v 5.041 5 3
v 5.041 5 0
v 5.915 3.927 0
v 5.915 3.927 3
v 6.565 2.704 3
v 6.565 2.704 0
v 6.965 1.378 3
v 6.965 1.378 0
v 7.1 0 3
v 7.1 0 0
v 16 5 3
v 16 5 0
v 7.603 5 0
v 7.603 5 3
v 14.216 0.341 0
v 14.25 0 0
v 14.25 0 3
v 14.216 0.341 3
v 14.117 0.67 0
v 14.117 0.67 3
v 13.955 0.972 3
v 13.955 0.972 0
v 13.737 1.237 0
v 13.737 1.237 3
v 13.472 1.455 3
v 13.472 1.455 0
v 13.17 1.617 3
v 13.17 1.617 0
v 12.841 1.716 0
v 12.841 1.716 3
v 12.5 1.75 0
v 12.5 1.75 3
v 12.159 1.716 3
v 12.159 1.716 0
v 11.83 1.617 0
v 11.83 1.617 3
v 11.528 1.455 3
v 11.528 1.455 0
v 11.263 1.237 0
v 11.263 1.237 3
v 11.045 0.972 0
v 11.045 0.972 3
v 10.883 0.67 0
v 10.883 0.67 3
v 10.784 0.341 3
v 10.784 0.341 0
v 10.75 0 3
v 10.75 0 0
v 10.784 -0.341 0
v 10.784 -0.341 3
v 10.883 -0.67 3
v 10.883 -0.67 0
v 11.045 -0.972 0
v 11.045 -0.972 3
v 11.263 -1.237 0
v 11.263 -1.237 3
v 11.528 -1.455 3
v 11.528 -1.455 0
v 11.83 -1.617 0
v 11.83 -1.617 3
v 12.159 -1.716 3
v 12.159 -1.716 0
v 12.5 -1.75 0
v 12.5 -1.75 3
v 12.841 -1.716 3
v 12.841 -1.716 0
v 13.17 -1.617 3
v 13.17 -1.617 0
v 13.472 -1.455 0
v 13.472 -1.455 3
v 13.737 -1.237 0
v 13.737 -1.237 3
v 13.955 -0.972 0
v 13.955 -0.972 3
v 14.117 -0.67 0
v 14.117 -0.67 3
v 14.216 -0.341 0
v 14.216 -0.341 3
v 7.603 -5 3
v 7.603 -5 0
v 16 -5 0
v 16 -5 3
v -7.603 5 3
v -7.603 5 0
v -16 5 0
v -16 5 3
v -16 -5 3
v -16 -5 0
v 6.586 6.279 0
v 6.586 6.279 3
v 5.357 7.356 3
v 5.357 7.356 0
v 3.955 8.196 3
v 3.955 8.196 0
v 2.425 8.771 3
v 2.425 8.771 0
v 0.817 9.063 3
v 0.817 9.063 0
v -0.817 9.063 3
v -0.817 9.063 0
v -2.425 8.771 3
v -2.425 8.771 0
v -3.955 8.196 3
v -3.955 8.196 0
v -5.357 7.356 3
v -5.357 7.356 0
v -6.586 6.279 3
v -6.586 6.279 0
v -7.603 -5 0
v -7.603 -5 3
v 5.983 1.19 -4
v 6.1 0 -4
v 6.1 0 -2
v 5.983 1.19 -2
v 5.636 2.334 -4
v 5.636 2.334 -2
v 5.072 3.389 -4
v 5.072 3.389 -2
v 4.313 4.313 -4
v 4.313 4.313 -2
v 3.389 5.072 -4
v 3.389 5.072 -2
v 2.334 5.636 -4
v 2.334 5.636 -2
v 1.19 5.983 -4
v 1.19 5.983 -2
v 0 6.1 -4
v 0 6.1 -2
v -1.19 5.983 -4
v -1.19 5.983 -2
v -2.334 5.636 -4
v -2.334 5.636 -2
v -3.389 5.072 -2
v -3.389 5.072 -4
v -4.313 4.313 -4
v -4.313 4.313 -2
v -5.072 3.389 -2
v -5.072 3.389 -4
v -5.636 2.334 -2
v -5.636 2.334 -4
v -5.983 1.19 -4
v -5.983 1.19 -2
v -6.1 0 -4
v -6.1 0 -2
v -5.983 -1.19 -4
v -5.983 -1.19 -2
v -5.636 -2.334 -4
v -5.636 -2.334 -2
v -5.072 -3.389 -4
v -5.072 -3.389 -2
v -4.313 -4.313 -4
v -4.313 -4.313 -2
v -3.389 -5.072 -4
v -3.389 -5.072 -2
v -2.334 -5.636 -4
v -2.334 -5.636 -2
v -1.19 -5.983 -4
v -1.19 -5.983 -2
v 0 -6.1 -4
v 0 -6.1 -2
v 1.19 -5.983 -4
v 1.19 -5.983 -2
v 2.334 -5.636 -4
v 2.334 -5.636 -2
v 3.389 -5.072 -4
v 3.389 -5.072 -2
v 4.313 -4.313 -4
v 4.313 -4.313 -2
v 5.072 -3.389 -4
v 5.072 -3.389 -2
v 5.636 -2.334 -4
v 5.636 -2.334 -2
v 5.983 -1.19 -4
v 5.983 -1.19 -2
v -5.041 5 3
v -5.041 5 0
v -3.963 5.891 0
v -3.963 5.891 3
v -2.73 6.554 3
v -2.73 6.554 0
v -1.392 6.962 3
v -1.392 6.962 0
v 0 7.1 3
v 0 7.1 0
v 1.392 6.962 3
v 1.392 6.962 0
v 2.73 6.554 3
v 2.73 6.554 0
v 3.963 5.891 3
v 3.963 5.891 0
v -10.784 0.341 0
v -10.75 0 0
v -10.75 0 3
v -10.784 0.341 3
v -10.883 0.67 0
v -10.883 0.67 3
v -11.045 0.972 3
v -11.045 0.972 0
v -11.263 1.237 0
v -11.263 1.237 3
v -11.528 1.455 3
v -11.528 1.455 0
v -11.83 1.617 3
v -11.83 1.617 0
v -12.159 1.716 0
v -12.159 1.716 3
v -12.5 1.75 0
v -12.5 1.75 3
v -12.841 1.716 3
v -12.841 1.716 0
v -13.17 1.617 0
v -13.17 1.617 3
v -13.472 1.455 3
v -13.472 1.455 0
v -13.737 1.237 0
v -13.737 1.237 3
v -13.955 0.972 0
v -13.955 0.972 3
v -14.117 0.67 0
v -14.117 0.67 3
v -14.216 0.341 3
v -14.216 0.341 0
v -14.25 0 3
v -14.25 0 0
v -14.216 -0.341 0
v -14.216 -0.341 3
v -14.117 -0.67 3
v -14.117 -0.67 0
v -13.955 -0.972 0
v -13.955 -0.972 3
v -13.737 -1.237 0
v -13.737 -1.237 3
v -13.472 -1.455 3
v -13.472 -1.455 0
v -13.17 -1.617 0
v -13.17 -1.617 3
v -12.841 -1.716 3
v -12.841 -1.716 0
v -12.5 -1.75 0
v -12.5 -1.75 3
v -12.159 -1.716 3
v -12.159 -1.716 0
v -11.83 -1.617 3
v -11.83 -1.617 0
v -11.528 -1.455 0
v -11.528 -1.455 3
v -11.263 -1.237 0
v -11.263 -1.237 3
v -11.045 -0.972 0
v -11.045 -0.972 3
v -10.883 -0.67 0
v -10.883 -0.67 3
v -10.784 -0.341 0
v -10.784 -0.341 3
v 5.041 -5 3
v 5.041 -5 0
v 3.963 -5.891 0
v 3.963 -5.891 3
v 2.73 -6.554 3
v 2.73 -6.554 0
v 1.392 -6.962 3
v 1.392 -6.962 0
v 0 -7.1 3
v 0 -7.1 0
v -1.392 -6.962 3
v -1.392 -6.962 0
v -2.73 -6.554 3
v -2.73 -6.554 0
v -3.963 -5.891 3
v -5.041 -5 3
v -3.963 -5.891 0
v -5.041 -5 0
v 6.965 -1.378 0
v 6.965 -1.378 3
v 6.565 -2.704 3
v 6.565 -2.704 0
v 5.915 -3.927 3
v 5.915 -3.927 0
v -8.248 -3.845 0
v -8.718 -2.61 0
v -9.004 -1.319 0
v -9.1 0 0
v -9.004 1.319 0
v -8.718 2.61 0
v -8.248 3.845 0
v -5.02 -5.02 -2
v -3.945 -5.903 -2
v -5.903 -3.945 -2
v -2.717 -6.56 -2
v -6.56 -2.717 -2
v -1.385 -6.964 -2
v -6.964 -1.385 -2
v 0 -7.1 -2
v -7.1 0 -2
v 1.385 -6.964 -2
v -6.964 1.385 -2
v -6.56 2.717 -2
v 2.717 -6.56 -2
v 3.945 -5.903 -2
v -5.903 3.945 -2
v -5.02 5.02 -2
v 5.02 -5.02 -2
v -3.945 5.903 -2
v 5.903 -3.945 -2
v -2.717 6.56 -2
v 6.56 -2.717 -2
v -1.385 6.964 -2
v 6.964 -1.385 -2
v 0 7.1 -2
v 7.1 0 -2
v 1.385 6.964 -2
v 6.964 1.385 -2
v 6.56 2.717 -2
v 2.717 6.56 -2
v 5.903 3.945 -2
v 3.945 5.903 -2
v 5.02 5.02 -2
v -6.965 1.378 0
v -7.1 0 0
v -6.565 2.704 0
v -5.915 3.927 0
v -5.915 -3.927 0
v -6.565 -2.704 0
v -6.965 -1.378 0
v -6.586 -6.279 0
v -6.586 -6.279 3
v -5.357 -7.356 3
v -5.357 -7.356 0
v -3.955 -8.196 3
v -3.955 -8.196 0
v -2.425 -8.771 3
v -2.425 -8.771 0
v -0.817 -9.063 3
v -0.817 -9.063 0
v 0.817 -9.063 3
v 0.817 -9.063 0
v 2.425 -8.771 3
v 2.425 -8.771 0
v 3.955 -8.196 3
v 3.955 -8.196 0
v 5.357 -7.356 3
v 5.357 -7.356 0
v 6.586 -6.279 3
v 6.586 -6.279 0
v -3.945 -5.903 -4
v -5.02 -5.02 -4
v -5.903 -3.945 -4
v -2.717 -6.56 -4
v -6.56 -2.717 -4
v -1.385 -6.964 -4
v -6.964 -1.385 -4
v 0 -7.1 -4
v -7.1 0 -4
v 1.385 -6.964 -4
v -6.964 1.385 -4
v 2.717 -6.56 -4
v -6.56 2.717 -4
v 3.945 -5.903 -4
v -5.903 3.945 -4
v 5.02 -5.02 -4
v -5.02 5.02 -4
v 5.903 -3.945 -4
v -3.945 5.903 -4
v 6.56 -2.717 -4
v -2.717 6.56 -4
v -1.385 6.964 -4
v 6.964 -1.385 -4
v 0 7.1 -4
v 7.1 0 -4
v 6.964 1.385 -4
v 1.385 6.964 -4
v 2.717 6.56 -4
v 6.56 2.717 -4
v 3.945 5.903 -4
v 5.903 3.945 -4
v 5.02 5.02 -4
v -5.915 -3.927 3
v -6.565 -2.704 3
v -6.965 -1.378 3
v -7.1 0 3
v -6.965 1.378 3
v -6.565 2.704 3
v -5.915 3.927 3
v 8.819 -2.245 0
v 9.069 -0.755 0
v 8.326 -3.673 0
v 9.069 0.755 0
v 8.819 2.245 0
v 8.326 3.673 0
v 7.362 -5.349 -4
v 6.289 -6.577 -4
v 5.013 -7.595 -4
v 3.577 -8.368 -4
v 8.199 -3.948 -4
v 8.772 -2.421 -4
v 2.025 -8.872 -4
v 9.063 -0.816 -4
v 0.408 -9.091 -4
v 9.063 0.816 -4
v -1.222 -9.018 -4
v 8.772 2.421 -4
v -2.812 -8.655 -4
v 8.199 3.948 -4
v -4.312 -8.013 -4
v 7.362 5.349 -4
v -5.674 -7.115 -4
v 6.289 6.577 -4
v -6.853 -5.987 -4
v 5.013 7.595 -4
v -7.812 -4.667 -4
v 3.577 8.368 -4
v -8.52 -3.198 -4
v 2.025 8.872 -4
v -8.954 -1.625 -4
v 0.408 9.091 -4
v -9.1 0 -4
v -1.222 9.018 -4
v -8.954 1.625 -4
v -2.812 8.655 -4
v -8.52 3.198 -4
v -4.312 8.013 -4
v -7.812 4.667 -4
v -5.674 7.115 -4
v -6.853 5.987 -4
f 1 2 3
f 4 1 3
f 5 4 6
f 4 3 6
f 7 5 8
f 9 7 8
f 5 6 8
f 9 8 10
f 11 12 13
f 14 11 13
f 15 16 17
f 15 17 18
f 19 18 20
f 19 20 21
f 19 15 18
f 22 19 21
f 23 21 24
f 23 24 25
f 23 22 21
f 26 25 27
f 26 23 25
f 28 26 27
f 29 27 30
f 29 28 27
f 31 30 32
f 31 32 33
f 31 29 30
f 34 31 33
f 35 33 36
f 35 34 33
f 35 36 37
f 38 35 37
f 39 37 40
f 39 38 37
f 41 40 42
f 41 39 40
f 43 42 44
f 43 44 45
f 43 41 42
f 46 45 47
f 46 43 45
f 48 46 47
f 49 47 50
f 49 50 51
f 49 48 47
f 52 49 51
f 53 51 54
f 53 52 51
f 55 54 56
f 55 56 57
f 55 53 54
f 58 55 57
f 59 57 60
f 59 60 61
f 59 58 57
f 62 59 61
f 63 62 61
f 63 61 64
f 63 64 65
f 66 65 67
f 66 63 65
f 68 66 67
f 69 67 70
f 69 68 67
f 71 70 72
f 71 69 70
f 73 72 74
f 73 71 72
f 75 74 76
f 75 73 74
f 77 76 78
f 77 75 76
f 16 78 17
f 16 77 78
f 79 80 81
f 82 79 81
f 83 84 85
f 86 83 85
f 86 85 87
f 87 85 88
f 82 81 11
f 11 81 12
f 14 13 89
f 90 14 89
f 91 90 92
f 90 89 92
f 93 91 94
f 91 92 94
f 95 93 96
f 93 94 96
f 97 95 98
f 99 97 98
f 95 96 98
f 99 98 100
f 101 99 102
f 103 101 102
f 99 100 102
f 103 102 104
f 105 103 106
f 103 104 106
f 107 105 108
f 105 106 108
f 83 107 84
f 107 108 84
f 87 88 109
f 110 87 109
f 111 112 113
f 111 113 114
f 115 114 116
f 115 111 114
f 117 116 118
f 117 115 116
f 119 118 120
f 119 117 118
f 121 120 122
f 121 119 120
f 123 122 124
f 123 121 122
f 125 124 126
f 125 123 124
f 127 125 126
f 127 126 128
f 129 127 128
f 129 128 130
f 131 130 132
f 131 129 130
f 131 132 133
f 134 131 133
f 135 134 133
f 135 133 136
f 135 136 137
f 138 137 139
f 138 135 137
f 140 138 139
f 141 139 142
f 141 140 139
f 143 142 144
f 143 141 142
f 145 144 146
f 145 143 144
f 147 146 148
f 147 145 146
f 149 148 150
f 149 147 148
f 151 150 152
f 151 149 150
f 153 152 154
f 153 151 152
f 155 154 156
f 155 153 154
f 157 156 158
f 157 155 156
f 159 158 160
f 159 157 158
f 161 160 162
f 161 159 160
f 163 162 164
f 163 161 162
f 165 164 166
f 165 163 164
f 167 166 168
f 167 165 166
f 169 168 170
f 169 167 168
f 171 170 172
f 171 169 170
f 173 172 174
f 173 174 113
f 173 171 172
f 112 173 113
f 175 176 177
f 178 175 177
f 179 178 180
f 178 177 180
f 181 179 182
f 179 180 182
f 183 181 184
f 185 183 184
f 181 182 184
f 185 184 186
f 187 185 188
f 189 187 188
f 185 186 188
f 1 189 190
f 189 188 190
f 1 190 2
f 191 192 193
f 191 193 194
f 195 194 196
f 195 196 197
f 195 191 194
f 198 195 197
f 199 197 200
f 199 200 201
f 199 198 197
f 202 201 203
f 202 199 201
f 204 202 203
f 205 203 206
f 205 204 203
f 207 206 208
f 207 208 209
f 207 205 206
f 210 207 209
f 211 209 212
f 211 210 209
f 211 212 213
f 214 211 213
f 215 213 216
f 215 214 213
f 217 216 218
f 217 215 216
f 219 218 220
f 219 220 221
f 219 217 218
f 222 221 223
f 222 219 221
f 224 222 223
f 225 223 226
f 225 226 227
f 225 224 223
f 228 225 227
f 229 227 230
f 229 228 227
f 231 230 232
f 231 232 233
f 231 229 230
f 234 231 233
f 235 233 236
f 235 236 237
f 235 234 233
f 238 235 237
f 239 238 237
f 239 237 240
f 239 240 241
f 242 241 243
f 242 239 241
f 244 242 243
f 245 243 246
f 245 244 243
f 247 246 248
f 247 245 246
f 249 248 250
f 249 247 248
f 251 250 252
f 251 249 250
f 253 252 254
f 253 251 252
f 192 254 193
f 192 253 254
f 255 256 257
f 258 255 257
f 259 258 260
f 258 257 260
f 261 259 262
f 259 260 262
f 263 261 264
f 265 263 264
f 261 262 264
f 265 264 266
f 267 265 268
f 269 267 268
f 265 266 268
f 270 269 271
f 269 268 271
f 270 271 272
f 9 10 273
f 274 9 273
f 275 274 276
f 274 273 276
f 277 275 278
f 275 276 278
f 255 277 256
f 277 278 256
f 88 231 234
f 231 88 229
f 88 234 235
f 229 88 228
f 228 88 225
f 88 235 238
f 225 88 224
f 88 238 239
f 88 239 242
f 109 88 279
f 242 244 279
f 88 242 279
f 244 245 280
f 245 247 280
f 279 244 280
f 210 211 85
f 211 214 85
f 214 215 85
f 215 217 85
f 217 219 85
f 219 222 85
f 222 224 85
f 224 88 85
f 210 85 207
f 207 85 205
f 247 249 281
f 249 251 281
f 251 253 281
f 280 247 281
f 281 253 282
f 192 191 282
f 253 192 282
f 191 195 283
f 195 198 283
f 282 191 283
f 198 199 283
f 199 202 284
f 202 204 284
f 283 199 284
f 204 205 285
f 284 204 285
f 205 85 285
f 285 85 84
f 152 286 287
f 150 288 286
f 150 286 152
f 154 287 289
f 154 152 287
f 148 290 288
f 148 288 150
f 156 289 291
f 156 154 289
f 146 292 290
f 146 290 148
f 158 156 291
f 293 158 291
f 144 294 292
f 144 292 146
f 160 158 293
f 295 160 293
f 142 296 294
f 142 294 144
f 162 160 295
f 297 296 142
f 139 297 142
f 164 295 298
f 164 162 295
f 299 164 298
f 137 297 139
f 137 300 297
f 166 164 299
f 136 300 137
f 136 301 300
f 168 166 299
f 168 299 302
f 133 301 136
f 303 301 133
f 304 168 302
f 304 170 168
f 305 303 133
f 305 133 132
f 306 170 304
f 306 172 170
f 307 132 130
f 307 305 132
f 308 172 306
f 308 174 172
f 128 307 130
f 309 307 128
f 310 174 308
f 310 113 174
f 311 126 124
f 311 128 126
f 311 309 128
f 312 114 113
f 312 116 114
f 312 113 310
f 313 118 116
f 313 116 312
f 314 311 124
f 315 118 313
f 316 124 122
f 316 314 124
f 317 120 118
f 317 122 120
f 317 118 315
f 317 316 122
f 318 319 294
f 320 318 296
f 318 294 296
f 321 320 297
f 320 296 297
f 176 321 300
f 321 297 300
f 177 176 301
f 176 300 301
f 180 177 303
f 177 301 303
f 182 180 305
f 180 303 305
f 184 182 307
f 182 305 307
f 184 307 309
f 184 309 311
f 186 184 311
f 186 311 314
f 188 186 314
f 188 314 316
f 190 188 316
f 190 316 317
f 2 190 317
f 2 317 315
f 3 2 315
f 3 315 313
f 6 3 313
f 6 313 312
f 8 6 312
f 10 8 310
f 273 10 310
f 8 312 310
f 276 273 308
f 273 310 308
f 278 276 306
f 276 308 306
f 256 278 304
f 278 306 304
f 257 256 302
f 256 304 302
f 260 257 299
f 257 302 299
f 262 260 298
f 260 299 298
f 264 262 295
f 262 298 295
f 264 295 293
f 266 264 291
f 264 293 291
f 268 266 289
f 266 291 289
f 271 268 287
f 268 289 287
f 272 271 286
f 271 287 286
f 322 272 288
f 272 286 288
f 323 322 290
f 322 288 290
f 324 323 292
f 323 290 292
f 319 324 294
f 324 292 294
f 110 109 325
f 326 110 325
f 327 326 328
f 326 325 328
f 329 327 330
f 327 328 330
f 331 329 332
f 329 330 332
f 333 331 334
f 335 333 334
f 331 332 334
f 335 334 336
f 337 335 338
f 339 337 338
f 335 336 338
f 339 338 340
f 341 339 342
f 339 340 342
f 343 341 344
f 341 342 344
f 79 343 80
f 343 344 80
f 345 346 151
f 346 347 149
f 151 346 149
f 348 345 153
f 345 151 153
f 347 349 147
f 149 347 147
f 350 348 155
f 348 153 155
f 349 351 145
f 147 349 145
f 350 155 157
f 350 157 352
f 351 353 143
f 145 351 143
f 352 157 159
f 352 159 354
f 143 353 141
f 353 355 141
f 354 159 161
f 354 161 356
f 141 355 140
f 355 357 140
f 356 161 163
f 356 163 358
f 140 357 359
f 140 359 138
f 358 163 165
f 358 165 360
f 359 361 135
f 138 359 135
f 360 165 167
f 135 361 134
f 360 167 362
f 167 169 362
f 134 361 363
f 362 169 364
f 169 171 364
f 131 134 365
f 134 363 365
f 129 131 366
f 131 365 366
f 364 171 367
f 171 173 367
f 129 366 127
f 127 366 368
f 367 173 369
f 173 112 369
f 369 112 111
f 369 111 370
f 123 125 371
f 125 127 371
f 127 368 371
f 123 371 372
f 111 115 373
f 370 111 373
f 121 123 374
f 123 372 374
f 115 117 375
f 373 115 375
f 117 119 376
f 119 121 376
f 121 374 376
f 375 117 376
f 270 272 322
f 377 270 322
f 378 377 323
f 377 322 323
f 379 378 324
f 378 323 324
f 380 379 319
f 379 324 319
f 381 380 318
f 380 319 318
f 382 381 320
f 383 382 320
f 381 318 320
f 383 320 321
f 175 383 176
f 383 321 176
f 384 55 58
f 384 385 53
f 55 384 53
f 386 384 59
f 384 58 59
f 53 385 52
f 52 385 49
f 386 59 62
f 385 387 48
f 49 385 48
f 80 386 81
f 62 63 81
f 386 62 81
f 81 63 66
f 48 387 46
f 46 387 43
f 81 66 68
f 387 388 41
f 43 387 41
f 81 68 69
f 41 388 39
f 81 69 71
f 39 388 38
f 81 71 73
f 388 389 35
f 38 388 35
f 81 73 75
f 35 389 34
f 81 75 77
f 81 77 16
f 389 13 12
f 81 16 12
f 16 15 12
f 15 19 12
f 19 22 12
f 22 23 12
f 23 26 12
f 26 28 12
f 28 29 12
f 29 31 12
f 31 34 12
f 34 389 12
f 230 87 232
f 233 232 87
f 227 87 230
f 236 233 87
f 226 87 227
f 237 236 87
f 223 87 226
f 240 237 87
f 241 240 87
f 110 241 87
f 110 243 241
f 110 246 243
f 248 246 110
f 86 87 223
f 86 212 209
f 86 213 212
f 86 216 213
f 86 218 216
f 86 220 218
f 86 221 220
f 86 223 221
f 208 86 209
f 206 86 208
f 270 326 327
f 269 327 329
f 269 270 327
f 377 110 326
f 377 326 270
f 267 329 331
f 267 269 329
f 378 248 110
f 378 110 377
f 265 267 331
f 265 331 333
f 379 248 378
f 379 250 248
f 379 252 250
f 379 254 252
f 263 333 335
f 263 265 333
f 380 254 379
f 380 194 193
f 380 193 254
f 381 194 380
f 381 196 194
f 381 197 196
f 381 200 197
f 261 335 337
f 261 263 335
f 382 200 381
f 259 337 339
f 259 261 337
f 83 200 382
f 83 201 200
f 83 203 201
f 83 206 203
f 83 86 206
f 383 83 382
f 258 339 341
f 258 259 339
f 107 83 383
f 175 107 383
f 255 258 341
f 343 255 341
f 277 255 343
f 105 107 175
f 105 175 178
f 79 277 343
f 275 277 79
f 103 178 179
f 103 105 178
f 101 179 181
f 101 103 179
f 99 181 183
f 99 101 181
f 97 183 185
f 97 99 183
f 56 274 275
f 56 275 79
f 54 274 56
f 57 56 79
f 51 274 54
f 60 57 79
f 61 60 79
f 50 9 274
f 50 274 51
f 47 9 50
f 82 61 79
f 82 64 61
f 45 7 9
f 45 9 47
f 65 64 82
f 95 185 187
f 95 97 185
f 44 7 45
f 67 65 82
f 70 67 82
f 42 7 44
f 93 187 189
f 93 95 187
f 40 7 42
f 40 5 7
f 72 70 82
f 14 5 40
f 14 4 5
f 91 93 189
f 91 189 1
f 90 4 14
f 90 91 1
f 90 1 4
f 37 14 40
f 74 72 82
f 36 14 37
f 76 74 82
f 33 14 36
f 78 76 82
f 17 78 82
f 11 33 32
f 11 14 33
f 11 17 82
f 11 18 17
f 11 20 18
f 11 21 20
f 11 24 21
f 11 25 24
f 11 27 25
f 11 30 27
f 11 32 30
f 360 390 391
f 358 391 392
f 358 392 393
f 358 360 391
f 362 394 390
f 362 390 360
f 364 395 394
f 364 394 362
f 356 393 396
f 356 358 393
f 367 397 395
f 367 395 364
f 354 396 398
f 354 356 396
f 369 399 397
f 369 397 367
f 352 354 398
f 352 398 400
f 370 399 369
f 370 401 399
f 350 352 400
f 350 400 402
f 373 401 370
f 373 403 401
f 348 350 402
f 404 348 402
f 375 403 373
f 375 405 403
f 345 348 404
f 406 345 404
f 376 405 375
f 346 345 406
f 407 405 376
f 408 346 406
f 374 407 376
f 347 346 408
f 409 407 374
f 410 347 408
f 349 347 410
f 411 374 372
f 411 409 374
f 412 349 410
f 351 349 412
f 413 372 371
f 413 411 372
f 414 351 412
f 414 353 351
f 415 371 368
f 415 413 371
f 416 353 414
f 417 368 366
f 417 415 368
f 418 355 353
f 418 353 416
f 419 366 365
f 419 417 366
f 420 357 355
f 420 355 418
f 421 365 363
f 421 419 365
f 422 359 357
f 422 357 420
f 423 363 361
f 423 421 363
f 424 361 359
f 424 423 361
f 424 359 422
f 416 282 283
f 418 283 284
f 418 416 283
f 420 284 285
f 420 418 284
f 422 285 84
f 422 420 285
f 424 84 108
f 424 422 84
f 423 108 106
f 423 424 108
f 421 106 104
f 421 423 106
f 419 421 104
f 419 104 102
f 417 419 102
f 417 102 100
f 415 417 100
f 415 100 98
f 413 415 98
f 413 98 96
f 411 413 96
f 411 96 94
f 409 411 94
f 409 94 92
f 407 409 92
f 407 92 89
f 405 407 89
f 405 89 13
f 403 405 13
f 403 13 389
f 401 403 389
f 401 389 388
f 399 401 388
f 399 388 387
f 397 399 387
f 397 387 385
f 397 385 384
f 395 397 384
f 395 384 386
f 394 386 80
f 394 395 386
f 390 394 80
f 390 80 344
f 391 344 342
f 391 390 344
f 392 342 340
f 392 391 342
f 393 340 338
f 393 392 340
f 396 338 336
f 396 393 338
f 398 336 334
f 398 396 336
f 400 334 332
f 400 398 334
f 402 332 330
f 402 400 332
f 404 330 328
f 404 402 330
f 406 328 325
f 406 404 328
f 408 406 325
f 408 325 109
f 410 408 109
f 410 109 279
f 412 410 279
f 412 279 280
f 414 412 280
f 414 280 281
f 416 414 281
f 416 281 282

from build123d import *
from build123d.topology import SkipClean

# Parameters (mm, degrees)
SKETCH_1_R      = 1.75
EXTRUDE_1_DEPTH = 3
EXTRUDE_START   = 4
SKETCH_2_R      = 9.1
SKETCH_2_R_2    = 7.1
EXTRUDE_2_DEPTH = 4
SKETCH_3_R      = 7.1
SKETCH_3_R_2    = 6.1
EXTRUDE_3_DEPTH = 2


with BuildPart() as part:
    # Эскиз1 → Бобышка-Вытянуть1 (new body)
    # profile 1 of 8: a face of its own
    with BuildSketch(Plane.XY):
        with BuildLine():
            Line((-16, 5), (-16, -5))
            Line((-16, -5), (-7.603288762, -5))
            ThreePointArc((-7.603288762, -5), (-9.1, 0), (-7.603288762, 5))
            Line((-7.603288762, 5), (-16, 5))
        make_face()
        with Locations((-12.5, 0)):
            Circle(SKETCH_1_R, mode=Mode.SUBTRACT)
    # profile 2 of 8: a face of its own
    with BuildSketch(Plane.XY):
        with BuildLine():
            ThreePointArc((-7.603288762, 5), (-9.1, 0), (-7.603288762, -5))
            Line((-7.603288762, -5), (-5.040833264, -5))
            ThreePointArc((-5.040833264, -5), (-7.1, 0), (-5.040833264, 5))
            Line((-5.040833264, 5), (-7.603288762, 5))
        make_face()
    # profile 3 of 8: a face of its own
    with BuildSketch(Plane.XY):
        with BuildLine():
            Line((5.040833264, -5), (7.603288762, -5))
            ThreePointArc((7.603288762, -5), (8.717795815, -2.609604593), (9.1, 0))
            ThreePointArc((9.1, 0), (8.717795815, 2.609604593), (7.603288762, 5))
            Line((7.603288762, 5), (5.040833264, 5))
            ThreePointArc((5.040833264, 5), (6.565055833, 2.703708918), (7.1, 0))
            ThreePointArc((7.1, 0), (6.565055833, -2.703708918), (5.040833264, -5))
        make_face()
    # profile 4 of 8: a face of its own
    with BuildSketch(Plane.XY):
        with BuildLine():
            ThreePointArc((7.603288762, 5), (0, 9.1), (-7.603288762, 5))
            Line((-7.603288762, 5), (-5.040833264, 5))
            ThreePointArc((-5.040833264, 5), (0, 7.1), (5.040833264, 5))
            Line((5.040833264, 5), (7.603288762, 5))
        make_face()
    # profile 5 of 8: a face of its own
    with BuildSketch(Plane.XY):
        with BuildLine():
            ThreePointArc((-7.603288762, 5), (-9.1, 0), (-7.603288762, -5))
            Line((-7.603288762, -5), (-5.040833264, -5))
            ThreePointArc((-5.040833264, -5), (-7.1, 0), (-5.040833264, 5))
            Line((-5.040833264, 5), (-7.603288762, 5))
        make_face()
    # profile 6 of 8: a face of its own
    with BuildSketch(Plane.XY):
        with BuildLine():
            Line((5.040833264, -5), (7.603288762, -5))
            ThreePointArc((7.603288762, -5), (8.717795815, -2.609604593), (9.1, 0))
            ThreePointArc((9.1, 0), (8.717795815, 2.609604593), (7.603288762, 5))
            Line((7.603288762, 5), (5.040833264, 5))
            ThreePointArc((5.040833264, 5), (6.565055833, 2.703708918), (7.1, 0))
            ThreePointArc((7.1, 0), (6.565055833, -2.703708918), (5.040833264, -5))
        make_face()
    # profile 7 of 8: a face of its own
    with BuildSketch(Plane.XY):
        with BuildLine():
            ThreePointArc((9.1, 0), (8.717795815, -2.609604593), (7.603288762, -5))
            Line((7.603288762, -5), (16, -5))
            Line((16, -5), (16, 5))
            Line((16, 5), (7.603288762, 5))
            ThreePointArc((7.603288762, 5), (8.717795815, 2.609604593), (9.1, 0))
        make_face()
        with Locations((12.5, 0)):
            Circle(SKETCH_1_R, mode=Mode.SUBTRACT)
    # profile 8 of 8: a face of its own
    with BuildSketch(Plane.XY):
        with BuildLine():
            Line((-5.040833264, -5), (-7.603288762, -5))
            ThreePointArc((-7.603288762, -5), (0, -9.1), (7.603288762, -5))
            Line((7.603288762, -5), (5.040833264, -5))
            ThreePointArc((5.040833264, -5), (0, -7.1), (-5.040833264, -5))
        make_face()
    extrude(amount=EXTRUDE_1_DEPTH)

    # Эскиз2 → Бобышка-Вытянуть2 (add)
    with SkipClean():  # the faces are left unmerged after this step: merging them gives an invalid solid
        with BuildSketch(Plane(origin=(0, 0, 0), x_dir=(-1, 0, 0), z_dir=(0, 0, -1)).offset(EXTRUDE_START)):
            Circle(SKETCH_2_R)
            Circle(SKETCH_2_R_2, mode=Mode.SUBTRACT)
        extrude(amount=-EXTRUDE_2_DEPTH)

    # Эскиз3 → Бобышка-Вытянуть3 (add)
    with SkipClean():  # the faces are left unmerged after this step: merging them gives an invalid solid
        with BuildSketch(Plane.XY.offset(-4)):
            Circle(SKETCH_3_R)
            Circle(SKETCH_3_R_2, mode=Mode.SUBTRACT)
        extrude(amount=EXTRUDE_3_DEPTH)


solid = part.part
